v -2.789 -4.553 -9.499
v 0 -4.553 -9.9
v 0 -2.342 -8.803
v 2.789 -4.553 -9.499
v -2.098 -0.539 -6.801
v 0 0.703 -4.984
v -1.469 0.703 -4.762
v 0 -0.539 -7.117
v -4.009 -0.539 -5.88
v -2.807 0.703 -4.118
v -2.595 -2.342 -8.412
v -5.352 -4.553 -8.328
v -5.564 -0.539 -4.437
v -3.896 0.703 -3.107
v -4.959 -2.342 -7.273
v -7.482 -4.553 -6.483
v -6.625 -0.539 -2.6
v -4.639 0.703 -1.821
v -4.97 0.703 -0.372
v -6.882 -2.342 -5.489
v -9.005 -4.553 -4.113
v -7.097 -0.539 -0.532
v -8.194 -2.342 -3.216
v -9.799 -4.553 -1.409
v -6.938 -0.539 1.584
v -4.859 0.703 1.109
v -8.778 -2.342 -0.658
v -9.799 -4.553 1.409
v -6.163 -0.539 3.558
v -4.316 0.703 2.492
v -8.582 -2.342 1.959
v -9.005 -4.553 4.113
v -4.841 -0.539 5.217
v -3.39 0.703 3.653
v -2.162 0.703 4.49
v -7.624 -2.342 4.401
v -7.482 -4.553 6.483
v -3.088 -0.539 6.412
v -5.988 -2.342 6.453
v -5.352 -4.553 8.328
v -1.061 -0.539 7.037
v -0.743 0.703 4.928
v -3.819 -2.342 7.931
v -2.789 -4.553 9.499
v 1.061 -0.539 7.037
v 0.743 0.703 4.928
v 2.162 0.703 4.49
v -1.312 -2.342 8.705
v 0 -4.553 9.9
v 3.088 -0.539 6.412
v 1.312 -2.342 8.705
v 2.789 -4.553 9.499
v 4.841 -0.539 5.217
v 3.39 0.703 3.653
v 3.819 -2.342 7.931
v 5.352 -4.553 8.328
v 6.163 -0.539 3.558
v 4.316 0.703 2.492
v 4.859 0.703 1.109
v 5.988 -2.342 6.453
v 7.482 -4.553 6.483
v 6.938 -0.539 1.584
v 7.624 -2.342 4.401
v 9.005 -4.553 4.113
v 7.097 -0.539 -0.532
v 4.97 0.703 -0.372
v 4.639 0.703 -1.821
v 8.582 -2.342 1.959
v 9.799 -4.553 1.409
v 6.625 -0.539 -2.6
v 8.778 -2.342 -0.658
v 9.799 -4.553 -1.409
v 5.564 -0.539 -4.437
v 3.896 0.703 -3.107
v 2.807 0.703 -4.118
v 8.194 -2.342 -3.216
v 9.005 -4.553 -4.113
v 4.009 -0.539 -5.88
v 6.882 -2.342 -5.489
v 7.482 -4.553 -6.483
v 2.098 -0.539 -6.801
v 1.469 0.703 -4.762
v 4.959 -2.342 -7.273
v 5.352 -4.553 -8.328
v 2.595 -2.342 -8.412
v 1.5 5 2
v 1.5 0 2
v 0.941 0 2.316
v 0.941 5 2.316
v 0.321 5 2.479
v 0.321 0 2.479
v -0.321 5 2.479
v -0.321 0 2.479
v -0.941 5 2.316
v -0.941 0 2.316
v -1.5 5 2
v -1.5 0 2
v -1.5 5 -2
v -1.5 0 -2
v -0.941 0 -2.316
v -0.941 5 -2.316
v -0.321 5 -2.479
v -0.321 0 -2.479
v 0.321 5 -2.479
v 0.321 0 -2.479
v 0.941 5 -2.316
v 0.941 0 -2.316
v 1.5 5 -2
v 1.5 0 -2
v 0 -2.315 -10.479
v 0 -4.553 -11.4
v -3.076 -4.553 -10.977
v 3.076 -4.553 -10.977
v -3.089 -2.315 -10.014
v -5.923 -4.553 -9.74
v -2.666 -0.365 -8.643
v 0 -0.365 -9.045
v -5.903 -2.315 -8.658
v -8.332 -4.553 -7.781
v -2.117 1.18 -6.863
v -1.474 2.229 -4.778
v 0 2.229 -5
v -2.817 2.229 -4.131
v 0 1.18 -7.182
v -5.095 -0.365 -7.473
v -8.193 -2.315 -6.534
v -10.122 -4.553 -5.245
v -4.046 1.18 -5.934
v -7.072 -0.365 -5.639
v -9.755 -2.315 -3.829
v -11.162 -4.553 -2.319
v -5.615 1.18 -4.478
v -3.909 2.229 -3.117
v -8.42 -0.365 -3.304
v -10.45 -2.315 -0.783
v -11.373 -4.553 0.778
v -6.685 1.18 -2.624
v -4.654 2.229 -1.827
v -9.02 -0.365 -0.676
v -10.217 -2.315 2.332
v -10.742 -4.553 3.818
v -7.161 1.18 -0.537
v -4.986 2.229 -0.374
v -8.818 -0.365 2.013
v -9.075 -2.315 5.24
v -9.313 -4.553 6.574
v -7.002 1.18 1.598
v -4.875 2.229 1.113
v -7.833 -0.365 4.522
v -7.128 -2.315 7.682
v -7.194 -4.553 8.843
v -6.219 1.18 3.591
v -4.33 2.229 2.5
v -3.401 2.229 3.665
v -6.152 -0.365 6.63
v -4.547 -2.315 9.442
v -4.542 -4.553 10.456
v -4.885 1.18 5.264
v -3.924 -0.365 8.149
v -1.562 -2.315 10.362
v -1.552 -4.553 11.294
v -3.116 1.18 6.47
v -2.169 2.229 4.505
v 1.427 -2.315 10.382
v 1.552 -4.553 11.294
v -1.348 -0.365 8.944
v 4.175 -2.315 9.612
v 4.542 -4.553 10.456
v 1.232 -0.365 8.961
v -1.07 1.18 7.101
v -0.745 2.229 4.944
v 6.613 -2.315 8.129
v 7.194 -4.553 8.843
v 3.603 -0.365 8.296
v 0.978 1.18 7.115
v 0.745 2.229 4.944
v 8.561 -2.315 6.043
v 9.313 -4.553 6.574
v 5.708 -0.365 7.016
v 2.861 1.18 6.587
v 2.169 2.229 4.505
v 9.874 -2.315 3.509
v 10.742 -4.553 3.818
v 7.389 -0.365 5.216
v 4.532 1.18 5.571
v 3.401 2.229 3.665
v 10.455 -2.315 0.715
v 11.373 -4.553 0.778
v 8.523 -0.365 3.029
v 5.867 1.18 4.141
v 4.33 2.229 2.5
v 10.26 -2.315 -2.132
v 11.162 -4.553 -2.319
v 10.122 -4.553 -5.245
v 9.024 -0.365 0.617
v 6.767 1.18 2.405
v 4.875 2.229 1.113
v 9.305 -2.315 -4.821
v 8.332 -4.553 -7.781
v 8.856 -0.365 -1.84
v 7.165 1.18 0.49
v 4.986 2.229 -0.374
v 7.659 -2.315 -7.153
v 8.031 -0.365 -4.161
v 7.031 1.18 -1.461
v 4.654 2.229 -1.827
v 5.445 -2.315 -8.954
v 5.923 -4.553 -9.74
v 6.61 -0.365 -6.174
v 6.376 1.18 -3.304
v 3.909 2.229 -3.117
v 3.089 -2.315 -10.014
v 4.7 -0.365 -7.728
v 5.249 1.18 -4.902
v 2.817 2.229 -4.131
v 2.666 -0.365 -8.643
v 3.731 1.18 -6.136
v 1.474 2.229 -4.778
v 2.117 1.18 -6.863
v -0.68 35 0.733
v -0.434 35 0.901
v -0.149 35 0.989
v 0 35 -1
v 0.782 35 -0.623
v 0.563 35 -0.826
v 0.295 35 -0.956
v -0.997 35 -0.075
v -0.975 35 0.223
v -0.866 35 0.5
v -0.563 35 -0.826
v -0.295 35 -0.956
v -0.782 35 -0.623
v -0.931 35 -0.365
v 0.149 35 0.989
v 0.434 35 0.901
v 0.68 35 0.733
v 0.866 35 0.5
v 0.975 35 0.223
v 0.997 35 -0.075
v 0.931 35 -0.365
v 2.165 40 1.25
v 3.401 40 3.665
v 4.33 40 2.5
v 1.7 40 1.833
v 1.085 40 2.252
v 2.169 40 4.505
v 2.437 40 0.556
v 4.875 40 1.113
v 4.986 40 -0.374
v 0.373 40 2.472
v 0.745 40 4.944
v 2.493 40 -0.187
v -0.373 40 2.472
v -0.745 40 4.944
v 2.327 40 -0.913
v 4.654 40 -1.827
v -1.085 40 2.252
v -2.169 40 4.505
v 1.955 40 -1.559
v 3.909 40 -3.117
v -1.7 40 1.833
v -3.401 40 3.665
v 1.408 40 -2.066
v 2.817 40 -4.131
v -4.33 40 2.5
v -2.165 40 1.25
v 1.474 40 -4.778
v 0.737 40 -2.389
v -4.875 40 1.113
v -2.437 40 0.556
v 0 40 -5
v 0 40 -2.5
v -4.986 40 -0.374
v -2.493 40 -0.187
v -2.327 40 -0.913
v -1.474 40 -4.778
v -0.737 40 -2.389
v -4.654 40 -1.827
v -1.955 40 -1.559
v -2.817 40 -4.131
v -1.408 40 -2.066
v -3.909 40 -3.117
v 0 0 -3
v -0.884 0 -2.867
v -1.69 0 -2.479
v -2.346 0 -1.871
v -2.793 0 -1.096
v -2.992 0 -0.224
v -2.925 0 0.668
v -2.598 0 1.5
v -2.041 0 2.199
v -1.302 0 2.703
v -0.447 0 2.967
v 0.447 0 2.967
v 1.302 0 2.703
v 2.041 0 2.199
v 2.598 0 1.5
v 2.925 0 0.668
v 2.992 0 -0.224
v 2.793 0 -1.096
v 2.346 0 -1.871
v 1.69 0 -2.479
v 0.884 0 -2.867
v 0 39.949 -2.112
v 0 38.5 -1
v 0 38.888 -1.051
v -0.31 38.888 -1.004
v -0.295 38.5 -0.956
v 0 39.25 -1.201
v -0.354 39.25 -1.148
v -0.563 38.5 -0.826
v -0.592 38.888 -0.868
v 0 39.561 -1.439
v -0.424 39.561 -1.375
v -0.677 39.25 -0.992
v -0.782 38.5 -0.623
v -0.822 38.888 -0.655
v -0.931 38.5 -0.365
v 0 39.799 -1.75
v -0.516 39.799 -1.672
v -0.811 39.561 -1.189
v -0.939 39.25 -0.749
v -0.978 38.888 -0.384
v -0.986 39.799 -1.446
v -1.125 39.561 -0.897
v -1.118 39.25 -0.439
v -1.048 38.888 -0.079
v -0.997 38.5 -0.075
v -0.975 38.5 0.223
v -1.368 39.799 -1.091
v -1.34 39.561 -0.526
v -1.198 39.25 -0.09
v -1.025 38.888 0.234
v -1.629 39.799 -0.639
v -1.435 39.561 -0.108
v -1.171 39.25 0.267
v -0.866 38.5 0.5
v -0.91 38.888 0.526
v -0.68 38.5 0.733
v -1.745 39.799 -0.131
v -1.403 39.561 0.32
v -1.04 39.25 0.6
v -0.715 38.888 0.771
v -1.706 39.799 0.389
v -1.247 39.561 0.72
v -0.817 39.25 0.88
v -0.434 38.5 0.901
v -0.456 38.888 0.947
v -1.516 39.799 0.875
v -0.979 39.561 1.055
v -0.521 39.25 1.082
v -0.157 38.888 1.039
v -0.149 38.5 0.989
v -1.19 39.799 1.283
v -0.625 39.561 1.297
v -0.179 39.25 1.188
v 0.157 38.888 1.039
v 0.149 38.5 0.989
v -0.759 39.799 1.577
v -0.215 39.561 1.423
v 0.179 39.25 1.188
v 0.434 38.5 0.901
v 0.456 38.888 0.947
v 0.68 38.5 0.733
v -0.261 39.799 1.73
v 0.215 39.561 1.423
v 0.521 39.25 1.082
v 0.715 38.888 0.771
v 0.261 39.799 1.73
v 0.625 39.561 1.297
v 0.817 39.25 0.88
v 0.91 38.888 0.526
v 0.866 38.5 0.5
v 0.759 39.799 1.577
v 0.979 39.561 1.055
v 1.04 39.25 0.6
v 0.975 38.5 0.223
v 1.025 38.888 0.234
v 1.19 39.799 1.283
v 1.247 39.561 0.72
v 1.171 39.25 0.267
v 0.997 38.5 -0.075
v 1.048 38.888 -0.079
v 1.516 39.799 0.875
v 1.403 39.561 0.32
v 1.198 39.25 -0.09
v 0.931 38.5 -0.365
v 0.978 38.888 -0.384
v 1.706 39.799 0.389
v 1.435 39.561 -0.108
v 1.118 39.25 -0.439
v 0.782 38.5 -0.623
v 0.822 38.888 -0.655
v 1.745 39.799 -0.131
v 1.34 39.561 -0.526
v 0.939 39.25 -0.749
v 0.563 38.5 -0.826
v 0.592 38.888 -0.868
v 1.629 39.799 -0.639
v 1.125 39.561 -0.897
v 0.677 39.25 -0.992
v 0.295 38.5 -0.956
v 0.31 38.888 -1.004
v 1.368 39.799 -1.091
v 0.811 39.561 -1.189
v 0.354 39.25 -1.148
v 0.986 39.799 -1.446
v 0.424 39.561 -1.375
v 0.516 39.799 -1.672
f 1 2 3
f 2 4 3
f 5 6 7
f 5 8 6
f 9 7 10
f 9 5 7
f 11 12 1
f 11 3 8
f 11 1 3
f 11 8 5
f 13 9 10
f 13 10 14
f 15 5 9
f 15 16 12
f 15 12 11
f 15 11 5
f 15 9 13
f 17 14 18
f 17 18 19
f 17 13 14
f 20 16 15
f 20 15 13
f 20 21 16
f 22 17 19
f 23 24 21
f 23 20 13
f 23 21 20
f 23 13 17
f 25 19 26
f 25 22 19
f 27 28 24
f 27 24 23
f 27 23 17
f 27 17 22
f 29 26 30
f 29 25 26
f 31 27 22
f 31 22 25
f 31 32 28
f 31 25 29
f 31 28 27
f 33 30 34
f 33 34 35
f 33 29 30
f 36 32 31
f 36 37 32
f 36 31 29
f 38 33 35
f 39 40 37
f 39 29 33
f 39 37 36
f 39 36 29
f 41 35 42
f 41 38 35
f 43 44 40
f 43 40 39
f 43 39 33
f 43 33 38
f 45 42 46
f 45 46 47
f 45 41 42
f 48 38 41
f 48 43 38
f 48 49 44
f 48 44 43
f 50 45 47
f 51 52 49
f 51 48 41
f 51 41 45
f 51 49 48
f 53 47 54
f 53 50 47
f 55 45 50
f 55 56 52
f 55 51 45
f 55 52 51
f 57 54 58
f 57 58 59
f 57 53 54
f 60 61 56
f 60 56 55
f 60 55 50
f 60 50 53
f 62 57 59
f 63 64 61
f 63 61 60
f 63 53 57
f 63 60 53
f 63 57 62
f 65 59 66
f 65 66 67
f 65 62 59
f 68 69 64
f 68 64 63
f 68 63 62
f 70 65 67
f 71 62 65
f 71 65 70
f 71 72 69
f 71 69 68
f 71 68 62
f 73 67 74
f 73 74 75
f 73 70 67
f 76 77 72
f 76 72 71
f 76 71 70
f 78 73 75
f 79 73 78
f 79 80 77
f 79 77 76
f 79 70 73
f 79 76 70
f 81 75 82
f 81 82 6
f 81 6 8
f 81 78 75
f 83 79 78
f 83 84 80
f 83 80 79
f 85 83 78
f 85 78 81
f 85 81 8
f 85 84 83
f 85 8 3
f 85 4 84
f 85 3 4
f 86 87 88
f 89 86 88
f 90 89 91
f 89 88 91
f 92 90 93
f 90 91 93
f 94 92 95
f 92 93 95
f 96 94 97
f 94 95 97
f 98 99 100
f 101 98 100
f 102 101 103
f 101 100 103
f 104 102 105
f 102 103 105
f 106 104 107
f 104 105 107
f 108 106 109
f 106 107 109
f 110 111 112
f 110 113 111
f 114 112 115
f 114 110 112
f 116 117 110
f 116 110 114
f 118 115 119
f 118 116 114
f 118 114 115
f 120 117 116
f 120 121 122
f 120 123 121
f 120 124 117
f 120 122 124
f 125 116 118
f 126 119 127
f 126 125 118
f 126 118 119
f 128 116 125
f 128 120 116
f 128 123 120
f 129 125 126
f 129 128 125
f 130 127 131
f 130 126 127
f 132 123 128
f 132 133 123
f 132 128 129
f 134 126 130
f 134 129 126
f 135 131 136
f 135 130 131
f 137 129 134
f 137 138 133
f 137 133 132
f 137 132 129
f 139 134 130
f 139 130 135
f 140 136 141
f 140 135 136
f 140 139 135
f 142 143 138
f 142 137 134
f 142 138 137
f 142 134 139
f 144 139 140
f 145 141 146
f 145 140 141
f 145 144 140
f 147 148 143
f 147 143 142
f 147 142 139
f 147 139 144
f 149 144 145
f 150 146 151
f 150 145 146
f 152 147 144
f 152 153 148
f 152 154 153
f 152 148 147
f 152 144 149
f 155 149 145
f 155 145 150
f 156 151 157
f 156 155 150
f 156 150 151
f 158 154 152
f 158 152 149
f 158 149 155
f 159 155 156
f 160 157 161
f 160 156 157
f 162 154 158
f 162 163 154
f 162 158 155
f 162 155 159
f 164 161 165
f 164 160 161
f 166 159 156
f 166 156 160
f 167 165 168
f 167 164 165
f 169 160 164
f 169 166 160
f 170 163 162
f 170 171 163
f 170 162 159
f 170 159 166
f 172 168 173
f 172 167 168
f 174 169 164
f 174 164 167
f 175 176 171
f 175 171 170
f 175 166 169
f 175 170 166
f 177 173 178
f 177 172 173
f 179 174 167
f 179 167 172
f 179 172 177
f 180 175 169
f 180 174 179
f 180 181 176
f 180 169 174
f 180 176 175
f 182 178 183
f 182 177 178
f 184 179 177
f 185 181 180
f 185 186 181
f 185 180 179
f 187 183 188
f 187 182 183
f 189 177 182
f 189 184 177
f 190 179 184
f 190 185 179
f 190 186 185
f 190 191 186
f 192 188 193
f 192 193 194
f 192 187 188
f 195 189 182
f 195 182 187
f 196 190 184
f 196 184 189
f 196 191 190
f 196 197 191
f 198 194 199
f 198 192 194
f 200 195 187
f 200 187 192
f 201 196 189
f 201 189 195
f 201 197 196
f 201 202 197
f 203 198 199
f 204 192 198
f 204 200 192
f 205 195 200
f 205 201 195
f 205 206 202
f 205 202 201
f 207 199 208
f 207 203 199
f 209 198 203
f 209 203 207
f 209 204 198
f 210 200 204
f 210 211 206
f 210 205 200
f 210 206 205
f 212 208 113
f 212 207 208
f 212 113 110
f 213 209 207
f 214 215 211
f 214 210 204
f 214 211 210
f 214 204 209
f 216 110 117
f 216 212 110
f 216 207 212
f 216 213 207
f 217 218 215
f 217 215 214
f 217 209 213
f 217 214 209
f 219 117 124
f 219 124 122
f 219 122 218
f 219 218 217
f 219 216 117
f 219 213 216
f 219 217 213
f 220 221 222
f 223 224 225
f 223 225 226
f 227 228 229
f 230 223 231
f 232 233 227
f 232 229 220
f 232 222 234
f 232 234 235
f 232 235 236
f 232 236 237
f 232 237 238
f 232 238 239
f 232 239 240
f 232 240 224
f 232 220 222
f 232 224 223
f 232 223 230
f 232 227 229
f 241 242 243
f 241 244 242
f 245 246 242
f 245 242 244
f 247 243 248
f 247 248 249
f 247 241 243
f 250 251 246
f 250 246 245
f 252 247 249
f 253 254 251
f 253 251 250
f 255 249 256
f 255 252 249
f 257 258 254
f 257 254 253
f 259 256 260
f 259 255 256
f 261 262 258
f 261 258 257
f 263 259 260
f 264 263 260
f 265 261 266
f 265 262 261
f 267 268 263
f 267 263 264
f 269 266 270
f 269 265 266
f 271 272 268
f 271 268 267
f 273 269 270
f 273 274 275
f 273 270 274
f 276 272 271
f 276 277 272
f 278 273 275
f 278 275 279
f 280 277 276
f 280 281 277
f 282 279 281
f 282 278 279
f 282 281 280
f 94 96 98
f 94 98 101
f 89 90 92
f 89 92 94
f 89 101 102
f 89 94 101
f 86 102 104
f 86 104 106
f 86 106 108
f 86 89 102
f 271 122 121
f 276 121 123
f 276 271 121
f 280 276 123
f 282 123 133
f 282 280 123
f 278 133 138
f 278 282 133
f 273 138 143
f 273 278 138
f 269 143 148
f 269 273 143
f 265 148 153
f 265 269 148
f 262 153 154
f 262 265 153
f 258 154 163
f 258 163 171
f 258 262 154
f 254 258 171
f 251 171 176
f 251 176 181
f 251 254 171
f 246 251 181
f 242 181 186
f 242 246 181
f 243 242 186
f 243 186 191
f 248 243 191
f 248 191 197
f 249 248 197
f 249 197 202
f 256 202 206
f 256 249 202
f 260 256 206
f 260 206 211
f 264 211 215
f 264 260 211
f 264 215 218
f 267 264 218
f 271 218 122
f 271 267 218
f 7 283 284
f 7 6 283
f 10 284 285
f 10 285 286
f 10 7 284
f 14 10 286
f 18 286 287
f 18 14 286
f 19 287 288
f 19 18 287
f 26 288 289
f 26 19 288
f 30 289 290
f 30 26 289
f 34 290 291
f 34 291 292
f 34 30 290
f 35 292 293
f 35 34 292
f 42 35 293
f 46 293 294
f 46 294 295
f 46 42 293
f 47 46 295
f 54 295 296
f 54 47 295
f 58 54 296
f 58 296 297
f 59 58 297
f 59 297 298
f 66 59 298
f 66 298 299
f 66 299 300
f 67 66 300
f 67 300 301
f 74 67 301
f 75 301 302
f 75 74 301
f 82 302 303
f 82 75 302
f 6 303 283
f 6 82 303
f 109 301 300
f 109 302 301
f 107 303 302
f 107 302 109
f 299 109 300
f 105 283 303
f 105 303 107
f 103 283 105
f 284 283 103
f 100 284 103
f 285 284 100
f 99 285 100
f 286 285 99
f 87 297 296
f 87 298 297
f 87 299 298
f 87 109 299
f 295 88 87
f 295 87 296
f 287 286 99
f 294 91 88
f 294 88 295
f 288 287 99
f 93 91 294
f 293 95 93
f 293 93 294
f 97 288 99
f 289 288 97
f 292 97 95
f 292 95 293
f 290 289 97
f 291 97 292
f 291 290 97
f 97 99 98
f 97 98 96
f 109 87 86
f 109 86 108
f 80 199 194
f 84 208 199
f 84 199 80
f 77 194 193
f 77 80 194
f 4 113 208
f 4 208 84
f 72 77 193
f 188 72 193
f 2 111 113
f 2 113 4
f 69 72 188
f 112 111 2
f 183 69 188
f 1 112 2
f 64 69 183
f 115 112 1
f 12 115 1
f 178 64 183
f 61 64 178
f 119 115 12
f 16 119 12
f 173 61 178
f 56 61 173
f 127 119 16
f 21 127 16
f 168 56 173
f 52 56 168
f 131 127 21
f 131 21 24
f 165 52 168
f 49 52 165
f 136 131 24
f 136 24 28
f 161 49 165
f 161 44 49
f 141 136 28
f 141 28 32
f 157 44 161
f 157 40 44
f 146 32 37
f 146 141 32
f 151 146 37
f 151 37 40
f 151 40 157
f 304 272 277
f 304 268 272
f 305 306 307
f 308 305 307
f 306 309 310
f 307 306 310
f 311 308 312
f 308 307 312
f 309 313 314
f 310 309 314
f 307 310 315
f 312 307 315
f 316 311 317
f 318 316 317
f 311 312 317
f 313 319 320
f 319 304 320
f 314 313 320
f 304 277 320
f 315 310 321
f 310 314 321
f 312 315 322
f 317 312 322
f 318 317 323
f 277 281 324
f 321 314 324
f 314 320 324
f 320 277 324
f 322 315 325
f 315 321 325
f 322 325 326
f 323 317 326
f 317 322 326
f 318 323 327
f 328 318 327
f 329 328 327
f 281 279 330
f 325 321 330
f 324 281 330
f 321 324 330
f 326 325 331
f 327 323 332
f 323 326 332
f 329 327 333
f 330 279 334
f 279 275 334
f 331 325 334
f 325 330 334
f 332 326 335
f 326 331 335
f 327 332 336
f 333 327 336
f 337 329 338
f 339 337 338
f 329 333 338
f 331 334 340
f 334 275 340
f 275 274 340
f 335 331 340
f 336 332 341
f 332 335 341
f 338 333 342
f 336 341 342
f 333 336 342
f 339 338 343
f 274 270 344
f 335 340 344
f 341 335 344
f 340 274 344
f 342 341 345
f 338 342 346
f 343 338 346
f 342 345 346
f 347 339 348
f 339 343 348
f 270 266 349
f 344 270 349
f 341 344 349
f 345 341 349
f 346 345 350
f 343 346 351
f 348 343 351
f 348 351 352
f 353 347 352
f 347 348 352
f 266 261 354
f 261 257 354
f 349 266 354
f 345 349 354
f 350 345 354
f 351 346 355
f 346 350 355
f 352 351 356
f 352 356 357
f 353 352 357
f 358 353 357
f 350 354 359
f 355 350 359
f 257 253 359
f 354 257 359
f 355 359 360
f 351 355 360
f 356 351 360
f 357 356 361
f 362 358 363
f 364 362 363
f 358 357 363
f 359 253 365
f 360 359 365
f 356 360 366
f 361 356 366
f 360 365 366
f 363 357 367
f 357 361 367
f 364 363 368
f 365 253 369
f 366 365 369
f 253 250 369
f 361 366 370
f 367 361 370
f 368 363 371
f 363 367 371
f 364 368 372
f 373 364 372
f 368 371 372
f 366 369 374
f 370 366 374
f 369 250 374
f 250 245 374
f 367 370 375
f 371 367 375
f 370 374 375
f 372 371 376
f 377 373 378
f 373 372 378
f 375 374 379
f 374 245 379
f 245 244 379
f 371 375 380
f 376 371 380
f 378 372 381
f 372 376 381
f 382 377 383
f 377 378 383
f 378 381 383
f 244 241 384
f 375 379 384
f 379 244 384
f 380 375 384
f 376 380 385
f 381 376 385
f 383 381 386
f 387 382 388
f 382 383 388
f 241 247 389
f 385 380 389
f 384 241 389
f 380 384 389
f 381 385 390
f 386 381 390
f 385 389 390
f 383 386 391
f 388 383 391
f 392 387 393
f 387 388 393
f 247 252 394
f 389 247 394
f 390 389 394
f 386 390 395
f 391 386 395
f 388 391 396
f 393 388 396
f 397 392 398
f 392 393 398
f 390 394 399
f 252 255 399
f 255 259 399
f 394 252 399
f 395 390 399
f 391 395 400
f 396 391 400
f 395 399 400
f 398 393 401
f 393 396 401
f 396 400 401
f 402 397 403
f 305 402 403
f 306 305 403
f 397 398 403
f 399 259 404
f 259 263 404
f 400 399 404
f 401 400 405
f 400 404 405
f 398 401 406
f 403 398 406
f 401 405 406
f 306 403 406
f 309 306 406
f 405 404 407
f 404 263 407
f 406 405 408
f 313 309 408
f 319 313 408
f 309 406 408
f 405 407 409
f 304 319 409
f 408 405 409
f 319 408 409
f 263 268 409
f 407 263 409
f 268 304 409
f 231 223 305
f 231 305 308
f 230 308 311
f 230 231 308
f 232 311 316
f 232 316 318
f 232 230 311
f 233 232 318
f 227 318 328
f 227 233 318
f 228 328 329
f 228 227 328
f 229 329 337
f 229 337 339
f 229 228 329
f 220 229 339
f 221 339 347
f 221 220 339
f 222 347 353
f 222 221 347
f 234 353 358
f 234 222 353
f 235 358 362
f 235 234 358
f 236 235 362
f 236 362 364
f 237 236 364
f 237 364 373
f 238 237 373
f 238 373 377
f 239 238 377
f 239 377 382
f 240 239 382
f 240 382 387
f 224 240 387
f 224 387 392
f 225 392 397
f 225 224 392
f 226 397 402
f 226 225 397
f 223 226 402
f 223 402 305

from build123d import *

# Parameters (mm, degrees)
CUT_EXTRUDE1_DEPTH = 5
FILLET1_R          = 1.5


with BuildPart() as part:
    # Sketch1 → Revolve1 (revolve)
    with BuildSketch(Plane.XY, mode=Mode.PRIVATE) as revolve1_sk:
        with BuildLine():
            Line((-1, 35), (0, 35))
            Line((0, 35), (0, 0))
            Line((0, 0), (-3.000286873, 0))
            Line((-3.000286873, 0), (-4.983763516, 0.703110012))
            ThreePointArc((-4.983763516, 0.703110012), (-8.025665426, -1.379057303), (-9.900003631, -4.553241332))
            Line((-9.900003631, -4.553241332), (-11.400003631, -4.553241332))
            ThreePointArc((-11.400003631, -4.553241332), (-9.044878062, -0.365029449), (-5, 2.228558162))
            Line((-5, 2.228558162), (-5, 40))
            Line((-5, 40), (-1, 40))
            Line((-1, 40), (-1, 35))
        make_face()
    revolve(revolve1_sk.sketch.rotate(Axis((0, -4.474343066, 0), (0, 1, 0)), 270), axis=Axis((0, -4.474343066, 0), (0, 1, 0)))

    # Sketch2 → Cut-Extrude1 (cut)
    with BuildSketch(Plane.XZ):
        with BuildLine():
            ThreePointArc((1.5, 2), (0, 2.5), (-1.5, 2))
            Line((-1.5, 2), (1.5, 2))
        make_face()
        Polygon((-1.5, 2), (1.5, 2), (1.5, -2), align=None)
        Polygon((-1.5, 2), (1.5, -2), (-1.5, -2), align=None)
        with BuildLine():
            ThreePointArc((-1.5, -2), (0, -2.5), (1.5, -2))
            Line((1.5, -2), (-1.5, -2))
        make_face()
    extrude(amount=-CUT_EXTRUDE1_DEPTH, mode=Mode.SUBTRACT)

    # Fillet1
    fillet1_edges = [part.edges().sort_by_distance(p)[0] for p in [
        (0, 40, 1),
    ]]
    fillet(fillet1_edges, radius=FILLET1_R)


solid = part.part
